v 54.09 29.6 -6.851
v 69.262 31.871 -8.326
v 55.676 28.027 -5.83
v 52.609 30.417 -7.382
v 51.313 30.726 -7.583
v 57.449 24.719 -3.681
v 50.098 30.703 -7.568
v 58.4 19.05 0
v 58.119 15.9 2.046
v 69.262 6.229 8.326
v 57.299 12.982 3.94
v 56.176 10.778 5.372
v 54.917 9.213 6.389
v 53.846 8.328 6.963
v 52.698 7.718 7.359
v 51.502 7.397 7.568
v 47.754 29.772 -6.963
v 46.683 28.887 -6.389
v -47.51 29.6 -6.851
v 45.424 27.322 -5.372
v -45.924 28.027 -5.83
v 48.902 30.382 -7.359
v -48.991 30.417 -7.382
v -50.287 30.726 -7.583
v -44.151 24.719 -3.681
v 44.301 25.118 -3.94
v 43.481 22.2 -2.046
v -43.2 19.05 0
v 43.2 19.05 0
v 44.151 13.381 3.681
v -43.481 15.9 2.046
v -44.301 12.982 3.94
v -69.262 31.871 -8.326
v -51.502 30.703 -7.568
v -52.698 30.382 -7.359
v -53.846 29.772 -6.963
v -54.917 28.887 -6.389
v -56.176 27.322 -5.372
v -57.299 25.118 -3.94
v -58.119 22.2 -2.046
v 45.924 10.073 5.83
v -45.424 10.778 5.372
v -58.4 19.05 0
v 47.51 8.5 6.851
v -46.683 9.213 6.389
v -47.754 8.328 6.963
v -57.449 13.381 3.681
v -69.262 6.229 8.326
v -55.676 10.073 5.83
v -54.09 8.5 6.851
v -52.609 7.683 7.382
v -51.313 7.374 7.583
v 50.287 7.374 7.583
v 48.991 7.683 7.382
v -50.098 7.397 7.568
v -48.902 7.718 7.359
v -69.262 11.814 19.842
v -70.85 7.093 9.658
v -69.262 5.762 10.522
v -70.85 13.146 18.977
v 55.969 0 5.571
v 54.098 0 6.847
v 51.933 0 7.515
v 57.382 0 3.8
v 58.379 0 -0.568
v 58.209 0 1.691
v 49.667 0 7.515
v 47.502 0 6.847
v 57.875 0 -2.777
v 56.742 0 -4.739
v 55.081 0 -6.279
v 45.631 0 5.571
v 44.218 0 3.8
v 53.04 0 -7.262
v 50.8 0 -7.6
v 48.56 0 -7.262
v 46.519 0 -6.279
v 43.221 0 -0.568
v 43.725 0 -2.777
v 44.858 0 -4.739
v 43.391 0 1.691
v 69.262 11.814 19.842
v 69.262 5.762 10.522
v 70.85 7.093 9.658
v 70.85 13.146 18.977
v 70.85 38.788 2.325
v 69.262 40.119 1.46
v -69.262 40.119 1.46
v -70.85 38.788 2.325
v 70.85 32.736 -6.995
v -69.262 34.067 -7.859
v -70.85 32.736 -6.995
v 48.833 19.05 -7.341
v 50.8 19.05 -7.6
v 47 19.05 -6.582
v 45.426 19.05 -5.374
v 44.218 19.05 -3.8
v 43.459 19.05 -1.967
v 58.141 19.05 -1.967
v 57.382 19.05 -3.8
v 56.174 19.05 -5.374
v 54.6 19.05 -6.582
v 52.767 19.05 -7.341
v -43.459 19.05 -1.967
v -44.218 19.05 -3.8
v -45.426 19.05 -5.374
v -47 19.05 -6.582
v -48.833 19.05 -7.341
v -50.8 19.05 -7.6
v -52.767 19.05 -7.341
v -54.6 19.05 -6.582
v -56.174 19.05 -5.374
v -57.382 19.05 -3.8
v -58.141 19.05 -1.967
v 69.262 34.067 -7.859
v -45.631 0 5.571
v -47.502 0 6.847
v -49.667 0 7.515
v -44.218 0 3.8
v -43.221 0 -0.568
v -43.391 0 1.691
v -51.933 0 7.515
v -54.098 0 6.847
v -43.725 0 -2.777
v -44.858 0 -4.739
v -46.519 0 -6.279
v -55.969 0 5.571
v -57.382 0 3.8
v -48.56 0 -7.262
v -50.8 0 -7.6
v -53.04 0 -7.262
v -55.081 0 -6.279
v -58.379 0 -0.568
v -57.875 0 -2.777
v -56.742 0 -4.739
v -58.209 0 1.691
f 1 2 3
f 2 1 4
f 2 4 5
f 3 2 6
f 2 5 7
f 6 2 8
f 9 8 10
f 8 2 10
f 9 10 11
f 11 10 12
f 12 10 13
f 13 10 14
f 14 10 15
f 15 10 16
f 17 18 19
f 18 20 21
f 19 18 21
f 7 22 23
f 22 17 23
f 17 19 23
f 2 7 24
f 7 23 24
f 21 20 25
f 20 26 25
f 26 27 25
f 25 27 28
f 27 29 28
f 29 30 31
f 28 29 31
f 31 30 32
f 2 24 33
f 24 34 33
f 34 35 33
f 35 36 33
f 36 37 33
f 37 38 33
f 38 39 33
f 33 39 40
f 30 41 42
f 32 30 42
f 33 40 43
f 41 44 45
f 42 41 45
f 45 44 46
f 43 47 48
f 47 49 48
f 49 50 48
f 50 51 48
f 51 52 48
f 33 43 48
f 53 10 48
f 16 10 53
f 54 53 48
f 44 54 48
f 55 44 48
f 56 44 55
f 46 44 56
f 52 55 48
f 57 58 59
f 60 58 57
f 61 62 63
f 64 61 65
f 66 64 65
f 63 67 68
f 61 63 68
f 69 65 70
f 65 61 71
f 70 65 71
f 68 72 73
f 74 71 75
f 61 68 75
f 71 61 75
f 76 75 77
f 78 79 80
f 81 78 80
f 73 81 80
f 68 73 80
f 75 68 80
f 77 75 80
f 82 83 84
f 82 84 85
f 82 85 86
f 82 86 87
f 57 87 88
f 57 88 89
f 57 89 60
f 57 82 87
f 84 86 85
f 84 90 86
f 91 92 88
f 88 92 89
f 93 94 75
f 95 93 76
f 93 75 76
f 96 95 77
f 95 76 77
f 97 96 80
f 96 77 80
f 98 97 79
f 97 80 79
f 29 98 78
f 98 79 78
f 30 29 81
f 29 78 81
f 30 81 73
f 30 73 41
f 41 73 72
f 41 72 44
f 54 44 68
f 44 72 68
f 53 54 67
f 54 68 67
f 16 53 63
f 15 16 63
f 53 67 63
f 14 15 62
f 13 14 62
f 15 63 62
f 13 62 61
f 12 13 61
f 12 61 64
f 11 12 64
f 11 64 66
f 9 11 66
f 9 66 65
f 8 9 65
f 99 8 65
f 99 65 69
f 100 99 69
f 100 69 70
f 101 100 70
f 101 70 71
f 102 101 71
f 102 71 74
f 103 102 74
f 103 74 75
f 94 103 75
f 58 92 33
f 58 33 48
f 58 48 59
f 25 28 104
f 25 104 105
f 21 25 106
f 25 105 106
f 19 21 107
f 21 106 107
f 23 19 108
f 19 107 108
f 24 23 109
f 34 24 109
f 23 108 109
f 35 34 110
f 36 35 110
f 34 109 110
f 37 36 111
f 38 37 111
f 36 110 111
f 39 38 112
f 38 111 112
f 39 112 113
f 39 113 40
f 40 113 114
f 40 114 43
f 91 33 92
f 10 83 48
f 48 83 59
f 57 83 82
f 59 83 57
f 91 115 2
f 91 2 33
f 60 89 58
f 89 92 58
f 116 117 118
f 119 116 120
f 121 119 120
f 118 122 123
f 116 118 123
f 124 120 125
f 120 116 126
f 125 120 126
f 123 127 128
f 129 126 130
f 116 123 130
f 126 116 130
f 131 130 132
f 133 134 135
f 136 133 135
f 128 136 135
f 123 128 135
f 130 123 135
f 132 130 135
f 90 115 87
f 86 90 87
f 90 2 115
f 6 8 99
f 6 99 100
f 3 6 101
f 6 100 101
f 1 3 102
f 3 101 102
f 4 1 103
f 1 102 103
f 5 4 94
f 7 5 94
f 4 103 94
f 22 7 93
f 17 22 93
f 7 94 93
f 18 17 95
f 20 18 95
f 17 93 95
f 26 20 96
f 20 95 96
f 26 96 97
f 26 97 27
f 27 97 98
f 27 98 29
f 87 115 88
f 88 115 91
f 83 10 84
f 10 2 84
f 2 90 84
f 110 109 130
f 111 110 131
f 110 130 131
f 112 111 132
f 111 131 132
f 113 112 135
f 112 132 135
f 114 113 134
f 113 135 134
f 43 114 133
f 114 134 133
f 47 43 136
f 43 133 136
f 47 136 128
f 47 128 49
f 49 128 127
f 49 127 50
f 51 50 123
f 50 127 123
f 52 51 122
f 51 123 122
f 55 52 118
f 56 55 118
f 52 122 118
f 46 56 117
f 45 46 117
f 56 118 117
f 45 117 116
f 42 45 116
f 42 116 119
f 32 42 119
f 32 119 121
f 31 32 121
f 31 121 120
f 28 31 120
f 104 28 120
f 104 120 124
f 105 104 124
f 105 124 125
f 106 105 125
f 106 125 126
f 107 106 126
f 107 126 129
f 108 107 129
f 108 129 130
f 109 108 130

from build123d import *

# Parameters (mm, degrees)
SKETCH2_R             = 7.6
BOSS_EXTRUDE1_DEPTH   = 19.05
BOSS_EXTRUDE1_2_DEPTH = 19.05
SKETCH3_W             = 141.7
SKETCH3_H             = 33.75
BOSS_EXTRUDE2_DEPTH   = 12.7
BOSS_EXTRUDE3_REACH   = 78.533
CHAMFER2_SIZE         = 1.5875


with BuildPart() as part:
    # Sketch2 → Boss-Extrude1 (new body)
    with BuildSketch(Plane(origin=(0, 0, 0), x_dir=(1, 0, 0), z_dir=(0, 1, 0))):
        with Locations((-50.8, 0)):
            Circle(SKETCH2_R)
    extrude(amount=BOSS_EXTRUDE1_DEPTH)



with BuildPart() as body_2:
    # Sketch2 → Boss-Extrude1 2 (new body)
    with BuildSketch(Plane(origin=(0, 0, 0), x_dir=(1, 0, 0), z_dir=(0, 1, 0))):
        with Locations((50.8, 0)):
            Circle(SKETCH2_R)
    extrude(amount=BOSS_EXTRUDE1_2_DEPTH)


with BuildPart() as part_1:
    add(part.part)

    add(body_2.part)  # Boss-Extrude2 merges body 2
    # Sketch3 → Boss-Extrude2 (add)
    with BuildSketch(Plane(origin=(0, 5.650833475, 8.701520484), x_dir=(-1, 0, 0), z_dir=(0, 0.5446390350150281, 0.8386705679454234))):
        with Locations((0, -15.976674319)):
            Rectangle(SKETCH3_W, SKETCH3_H)
    extrude(amount=BOSS_EXTRUDE2_DEPTH)

    # Sketch8 → Boss-Extrude3 (add, up to next)
    with BuildSketch(Plane(origin=(0, 19.05, 0), x_dir=(1, 0, 0), z_dir=(0, 1, 0)), mode=Mode.PRIVATE) as boss_extrude3_sk1:
        with BuildLine():
            ThreePointArc((58.4, 0), (50.8, 7.6), (43.2, 0))
            Line((43.2, 0), (58.4, 0))
        make_face()
    boss_extrude3_tool1 = extrude(boss_extrude3_sk1.sketch, amount=BOSS_EXTRUDE3_REACH, mode=Mode.PRIVATE) - part_1.part
    # Sketch8 → Boss-Extrude3 (add, up to next)
    with BuildSketch(Plane(origin=(0, 19.05, 0), x_dir=(1, 0, 0), z_dir=(0, 1, 0)), mode=Mode.PRIVATE) as boss_extrude3_sk2:
        with BuildLine():
            ThreePointArc((-43.2, 0), (-50.8, 7.6), (-58.4, 0))
            Line((-58.4, 0), (-43.2, 0))
        make_face()
    boss_extrude3_tool2 = extrude(boss_extrude3_sk2.sketch, amount=BOSS_EXTRUDE3_REACH, mode=Mode.PRIVATE) - part_1.part
    add(boss_extrude3_tool1.solids().sort_by_distance((50.8, 19.05, -3.22554))[0])
    add(boss_extrude3_tool2.solids().sort_by_distance((-50.8, 19.05, -3.22554))[0])

    # Chamfer2
    chamfer2_edges = [part_1.edges().sort_by_distance(p)[0] for p in [
        (-70.85, 19.05, 0),
        (0, 33.202565834, -9.190783716),
        (70.85, 19.05, 0),
        (0, 4.897434166, 9.190783716),
        (-70.85, 8.355892038, 14.516341822),
        (70.85, 8.355892038, 14.516341822),
        (70.85, 36.661023706, -3.865225609),
        (-70.85, 36.661023706, -3.865225609),
    ]]
    chamfer(chamfer2_edges, length=CHAMFER2_SIZE)


solid = part_1.part
